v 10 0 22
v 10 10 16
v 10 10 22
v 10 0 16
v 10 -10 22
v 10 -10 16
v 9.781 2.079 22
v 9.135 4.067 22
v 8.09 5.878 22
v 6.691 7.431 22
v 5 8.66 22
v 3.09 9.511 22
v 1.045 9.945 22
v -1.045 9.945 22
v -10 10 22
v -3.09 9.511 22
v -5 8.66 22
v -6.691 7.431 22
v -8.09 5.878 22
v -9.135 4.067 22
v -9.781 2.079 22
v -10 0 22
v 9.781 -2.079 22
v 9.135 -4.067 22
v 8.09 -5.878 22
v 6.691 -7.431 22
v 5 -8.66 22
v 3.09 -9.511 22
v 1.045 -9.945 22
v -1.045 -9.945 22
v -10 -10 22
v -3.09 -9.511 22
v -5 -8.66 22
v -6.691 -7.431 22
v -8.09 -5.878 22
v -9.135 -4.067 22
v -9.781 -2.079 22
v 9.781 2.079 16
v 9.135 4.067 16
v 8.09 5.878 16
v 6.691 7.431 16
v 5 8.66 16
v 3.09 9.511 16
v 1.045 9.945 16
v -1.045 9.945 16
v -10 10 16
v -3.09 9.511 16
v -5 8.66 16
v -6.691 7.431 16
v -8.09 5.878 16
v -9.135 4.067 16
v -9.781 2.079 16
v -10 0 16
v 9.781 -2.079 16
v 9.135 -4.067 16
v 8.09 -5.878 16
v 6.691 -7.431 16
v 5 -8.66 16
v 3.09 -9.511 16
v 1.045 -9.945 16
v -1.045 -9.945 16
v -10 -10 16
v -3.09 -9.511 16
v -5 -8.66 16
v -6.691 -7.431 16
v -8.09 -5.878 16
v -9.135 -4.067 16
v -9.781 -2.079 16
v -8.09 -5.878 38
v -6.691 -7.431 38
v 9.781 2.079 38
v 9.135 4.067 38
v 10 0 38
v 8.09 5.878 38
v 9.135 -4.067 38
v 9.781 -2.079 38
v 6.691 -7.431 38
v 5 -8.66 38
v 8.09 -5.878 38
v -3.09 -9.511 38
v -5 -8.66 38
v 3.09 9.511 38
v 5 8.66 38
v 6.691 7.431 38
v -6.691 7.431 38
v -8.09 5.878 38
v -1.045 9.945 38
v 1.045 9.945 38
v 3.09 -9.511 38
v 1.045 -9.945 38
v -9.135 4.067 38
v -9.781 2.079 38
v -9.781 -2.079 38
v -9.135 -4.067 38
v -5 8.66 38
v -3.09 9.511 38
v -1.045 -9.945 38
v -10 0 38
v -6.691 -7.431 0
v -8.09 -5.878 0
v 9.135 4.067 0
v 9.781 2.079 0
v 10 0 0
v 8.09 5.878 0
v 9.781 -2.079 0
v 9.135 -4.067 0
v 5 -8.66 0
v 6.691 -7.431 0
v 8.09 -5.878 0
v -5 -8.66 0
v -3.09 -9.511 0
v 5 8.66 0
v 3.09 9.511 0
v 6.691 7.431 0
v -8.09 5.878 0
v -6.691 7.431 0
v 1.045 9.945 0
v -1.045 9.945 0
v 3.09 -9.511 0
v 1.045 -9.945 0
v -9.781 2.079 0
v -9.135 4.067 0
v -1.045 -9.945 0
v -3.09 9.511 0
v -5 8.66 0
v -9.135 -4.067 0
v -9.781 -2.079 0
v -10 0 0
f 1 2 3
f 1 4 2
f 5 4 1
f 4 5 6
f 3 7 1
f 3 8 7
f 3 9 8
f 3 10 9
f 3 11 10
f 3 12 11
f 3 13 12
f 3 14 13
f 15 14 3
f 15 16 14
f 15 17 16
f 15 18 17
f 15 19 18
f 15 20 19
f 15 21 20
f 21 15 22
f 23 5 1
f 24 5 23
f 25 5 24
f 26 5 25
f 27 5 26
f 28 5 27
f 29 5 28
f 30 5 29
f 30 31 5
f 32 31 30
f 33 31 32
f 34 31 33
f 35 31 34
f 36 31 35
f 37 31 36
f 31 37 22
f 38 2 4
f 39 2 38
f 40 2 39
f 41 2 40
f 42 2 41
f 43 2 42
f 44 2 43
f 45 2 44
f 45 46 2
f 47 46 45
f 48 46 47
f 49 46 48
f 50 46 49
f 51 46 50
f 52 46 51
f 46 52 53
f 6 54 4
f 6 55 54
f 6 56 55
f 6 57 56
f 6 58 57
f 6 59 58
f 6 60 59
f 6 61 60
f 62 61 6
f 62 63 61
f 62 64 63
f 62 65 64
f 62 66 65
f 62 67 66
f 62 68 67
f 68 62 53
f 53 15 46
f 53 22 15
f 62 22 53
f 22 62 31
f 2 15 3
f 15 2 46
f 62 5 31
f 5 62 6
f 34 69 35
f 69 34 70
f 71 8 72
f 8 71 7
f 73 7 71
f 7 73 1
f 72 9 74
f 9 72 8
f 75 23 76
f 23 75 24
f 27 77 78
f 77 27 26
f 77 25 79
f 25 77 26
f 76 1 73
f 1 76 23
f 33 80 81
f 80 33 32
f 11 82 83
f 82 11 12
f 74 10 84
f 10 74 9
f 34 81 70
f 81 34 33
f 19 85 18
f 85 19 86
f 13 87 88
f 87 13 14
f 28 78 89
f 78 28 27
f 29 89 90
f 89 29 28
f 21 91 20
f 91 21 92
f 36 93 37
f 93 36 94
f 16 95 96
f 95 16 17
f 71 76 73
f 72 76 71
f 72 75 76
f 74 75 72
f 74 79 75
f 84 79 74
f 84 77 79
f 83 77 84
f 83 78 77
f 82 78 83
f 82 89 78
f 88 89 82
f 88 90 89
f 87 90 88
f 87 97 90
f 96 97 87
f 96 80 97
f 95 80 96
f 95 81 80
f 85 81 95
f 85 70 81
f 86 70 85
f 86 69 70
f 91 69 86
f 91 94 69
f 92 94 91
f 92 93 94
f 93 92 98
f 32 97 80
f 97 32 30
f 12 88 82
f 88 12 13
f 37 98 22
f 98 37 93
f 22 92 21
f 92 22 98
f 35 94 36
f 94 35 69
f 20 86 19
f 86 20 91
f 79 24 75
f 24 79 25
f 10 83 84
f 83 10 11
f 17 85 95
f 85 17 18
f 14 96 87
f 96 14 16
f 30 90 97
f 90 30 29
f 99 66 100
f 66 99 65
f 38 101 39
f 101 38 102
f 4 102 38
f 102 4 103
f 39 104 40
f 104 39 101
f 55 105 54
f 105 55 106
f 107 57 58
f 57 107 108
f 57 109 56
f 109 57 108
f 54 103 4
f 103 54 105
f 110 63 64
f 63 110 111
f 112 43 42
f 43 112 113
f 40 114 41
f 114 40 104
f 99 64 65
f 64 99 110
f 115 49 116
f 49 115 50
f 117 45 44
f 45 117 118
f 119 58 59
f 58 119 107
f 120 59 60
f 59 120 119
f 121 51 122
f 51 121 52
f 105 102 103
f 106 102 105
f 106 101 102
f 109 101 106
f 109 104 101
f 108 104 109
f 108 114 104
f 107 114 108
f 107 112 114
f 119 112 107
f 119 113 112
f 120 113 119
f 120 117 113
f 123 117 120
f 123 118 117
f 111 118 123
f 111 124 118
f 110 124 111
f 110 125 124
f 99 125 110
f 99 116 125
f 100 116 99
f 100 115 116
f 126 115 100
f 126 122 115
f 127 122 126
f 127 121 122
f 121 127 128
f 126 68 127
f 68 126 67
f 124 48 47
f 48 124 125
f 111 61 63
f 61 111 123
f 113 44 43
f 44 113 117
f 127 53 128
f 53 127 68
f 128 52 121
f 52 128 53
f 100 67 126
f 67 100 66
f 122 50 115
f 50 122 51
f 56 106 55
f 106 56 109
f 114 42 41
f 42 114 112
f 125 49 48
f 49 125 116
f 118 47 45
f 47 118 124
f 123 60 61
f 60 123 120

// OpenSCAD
union()  {
translate([-10.0,-10.0,16.0])cube([20.0,20.0,4.0]);
translate([0.0,0.0,0.0])scale([1.0,1.0,1.0])cylinder(r=10.0,h=20.0);
union()  {
translate([-10.0,-10.0,16.0])cube([20.0,20.0,6.0]);
translate([0.0,0.0,18.0])scale([1.0,1.0,1.0])cylinder(r=10.0,h=20.0);
}
}
